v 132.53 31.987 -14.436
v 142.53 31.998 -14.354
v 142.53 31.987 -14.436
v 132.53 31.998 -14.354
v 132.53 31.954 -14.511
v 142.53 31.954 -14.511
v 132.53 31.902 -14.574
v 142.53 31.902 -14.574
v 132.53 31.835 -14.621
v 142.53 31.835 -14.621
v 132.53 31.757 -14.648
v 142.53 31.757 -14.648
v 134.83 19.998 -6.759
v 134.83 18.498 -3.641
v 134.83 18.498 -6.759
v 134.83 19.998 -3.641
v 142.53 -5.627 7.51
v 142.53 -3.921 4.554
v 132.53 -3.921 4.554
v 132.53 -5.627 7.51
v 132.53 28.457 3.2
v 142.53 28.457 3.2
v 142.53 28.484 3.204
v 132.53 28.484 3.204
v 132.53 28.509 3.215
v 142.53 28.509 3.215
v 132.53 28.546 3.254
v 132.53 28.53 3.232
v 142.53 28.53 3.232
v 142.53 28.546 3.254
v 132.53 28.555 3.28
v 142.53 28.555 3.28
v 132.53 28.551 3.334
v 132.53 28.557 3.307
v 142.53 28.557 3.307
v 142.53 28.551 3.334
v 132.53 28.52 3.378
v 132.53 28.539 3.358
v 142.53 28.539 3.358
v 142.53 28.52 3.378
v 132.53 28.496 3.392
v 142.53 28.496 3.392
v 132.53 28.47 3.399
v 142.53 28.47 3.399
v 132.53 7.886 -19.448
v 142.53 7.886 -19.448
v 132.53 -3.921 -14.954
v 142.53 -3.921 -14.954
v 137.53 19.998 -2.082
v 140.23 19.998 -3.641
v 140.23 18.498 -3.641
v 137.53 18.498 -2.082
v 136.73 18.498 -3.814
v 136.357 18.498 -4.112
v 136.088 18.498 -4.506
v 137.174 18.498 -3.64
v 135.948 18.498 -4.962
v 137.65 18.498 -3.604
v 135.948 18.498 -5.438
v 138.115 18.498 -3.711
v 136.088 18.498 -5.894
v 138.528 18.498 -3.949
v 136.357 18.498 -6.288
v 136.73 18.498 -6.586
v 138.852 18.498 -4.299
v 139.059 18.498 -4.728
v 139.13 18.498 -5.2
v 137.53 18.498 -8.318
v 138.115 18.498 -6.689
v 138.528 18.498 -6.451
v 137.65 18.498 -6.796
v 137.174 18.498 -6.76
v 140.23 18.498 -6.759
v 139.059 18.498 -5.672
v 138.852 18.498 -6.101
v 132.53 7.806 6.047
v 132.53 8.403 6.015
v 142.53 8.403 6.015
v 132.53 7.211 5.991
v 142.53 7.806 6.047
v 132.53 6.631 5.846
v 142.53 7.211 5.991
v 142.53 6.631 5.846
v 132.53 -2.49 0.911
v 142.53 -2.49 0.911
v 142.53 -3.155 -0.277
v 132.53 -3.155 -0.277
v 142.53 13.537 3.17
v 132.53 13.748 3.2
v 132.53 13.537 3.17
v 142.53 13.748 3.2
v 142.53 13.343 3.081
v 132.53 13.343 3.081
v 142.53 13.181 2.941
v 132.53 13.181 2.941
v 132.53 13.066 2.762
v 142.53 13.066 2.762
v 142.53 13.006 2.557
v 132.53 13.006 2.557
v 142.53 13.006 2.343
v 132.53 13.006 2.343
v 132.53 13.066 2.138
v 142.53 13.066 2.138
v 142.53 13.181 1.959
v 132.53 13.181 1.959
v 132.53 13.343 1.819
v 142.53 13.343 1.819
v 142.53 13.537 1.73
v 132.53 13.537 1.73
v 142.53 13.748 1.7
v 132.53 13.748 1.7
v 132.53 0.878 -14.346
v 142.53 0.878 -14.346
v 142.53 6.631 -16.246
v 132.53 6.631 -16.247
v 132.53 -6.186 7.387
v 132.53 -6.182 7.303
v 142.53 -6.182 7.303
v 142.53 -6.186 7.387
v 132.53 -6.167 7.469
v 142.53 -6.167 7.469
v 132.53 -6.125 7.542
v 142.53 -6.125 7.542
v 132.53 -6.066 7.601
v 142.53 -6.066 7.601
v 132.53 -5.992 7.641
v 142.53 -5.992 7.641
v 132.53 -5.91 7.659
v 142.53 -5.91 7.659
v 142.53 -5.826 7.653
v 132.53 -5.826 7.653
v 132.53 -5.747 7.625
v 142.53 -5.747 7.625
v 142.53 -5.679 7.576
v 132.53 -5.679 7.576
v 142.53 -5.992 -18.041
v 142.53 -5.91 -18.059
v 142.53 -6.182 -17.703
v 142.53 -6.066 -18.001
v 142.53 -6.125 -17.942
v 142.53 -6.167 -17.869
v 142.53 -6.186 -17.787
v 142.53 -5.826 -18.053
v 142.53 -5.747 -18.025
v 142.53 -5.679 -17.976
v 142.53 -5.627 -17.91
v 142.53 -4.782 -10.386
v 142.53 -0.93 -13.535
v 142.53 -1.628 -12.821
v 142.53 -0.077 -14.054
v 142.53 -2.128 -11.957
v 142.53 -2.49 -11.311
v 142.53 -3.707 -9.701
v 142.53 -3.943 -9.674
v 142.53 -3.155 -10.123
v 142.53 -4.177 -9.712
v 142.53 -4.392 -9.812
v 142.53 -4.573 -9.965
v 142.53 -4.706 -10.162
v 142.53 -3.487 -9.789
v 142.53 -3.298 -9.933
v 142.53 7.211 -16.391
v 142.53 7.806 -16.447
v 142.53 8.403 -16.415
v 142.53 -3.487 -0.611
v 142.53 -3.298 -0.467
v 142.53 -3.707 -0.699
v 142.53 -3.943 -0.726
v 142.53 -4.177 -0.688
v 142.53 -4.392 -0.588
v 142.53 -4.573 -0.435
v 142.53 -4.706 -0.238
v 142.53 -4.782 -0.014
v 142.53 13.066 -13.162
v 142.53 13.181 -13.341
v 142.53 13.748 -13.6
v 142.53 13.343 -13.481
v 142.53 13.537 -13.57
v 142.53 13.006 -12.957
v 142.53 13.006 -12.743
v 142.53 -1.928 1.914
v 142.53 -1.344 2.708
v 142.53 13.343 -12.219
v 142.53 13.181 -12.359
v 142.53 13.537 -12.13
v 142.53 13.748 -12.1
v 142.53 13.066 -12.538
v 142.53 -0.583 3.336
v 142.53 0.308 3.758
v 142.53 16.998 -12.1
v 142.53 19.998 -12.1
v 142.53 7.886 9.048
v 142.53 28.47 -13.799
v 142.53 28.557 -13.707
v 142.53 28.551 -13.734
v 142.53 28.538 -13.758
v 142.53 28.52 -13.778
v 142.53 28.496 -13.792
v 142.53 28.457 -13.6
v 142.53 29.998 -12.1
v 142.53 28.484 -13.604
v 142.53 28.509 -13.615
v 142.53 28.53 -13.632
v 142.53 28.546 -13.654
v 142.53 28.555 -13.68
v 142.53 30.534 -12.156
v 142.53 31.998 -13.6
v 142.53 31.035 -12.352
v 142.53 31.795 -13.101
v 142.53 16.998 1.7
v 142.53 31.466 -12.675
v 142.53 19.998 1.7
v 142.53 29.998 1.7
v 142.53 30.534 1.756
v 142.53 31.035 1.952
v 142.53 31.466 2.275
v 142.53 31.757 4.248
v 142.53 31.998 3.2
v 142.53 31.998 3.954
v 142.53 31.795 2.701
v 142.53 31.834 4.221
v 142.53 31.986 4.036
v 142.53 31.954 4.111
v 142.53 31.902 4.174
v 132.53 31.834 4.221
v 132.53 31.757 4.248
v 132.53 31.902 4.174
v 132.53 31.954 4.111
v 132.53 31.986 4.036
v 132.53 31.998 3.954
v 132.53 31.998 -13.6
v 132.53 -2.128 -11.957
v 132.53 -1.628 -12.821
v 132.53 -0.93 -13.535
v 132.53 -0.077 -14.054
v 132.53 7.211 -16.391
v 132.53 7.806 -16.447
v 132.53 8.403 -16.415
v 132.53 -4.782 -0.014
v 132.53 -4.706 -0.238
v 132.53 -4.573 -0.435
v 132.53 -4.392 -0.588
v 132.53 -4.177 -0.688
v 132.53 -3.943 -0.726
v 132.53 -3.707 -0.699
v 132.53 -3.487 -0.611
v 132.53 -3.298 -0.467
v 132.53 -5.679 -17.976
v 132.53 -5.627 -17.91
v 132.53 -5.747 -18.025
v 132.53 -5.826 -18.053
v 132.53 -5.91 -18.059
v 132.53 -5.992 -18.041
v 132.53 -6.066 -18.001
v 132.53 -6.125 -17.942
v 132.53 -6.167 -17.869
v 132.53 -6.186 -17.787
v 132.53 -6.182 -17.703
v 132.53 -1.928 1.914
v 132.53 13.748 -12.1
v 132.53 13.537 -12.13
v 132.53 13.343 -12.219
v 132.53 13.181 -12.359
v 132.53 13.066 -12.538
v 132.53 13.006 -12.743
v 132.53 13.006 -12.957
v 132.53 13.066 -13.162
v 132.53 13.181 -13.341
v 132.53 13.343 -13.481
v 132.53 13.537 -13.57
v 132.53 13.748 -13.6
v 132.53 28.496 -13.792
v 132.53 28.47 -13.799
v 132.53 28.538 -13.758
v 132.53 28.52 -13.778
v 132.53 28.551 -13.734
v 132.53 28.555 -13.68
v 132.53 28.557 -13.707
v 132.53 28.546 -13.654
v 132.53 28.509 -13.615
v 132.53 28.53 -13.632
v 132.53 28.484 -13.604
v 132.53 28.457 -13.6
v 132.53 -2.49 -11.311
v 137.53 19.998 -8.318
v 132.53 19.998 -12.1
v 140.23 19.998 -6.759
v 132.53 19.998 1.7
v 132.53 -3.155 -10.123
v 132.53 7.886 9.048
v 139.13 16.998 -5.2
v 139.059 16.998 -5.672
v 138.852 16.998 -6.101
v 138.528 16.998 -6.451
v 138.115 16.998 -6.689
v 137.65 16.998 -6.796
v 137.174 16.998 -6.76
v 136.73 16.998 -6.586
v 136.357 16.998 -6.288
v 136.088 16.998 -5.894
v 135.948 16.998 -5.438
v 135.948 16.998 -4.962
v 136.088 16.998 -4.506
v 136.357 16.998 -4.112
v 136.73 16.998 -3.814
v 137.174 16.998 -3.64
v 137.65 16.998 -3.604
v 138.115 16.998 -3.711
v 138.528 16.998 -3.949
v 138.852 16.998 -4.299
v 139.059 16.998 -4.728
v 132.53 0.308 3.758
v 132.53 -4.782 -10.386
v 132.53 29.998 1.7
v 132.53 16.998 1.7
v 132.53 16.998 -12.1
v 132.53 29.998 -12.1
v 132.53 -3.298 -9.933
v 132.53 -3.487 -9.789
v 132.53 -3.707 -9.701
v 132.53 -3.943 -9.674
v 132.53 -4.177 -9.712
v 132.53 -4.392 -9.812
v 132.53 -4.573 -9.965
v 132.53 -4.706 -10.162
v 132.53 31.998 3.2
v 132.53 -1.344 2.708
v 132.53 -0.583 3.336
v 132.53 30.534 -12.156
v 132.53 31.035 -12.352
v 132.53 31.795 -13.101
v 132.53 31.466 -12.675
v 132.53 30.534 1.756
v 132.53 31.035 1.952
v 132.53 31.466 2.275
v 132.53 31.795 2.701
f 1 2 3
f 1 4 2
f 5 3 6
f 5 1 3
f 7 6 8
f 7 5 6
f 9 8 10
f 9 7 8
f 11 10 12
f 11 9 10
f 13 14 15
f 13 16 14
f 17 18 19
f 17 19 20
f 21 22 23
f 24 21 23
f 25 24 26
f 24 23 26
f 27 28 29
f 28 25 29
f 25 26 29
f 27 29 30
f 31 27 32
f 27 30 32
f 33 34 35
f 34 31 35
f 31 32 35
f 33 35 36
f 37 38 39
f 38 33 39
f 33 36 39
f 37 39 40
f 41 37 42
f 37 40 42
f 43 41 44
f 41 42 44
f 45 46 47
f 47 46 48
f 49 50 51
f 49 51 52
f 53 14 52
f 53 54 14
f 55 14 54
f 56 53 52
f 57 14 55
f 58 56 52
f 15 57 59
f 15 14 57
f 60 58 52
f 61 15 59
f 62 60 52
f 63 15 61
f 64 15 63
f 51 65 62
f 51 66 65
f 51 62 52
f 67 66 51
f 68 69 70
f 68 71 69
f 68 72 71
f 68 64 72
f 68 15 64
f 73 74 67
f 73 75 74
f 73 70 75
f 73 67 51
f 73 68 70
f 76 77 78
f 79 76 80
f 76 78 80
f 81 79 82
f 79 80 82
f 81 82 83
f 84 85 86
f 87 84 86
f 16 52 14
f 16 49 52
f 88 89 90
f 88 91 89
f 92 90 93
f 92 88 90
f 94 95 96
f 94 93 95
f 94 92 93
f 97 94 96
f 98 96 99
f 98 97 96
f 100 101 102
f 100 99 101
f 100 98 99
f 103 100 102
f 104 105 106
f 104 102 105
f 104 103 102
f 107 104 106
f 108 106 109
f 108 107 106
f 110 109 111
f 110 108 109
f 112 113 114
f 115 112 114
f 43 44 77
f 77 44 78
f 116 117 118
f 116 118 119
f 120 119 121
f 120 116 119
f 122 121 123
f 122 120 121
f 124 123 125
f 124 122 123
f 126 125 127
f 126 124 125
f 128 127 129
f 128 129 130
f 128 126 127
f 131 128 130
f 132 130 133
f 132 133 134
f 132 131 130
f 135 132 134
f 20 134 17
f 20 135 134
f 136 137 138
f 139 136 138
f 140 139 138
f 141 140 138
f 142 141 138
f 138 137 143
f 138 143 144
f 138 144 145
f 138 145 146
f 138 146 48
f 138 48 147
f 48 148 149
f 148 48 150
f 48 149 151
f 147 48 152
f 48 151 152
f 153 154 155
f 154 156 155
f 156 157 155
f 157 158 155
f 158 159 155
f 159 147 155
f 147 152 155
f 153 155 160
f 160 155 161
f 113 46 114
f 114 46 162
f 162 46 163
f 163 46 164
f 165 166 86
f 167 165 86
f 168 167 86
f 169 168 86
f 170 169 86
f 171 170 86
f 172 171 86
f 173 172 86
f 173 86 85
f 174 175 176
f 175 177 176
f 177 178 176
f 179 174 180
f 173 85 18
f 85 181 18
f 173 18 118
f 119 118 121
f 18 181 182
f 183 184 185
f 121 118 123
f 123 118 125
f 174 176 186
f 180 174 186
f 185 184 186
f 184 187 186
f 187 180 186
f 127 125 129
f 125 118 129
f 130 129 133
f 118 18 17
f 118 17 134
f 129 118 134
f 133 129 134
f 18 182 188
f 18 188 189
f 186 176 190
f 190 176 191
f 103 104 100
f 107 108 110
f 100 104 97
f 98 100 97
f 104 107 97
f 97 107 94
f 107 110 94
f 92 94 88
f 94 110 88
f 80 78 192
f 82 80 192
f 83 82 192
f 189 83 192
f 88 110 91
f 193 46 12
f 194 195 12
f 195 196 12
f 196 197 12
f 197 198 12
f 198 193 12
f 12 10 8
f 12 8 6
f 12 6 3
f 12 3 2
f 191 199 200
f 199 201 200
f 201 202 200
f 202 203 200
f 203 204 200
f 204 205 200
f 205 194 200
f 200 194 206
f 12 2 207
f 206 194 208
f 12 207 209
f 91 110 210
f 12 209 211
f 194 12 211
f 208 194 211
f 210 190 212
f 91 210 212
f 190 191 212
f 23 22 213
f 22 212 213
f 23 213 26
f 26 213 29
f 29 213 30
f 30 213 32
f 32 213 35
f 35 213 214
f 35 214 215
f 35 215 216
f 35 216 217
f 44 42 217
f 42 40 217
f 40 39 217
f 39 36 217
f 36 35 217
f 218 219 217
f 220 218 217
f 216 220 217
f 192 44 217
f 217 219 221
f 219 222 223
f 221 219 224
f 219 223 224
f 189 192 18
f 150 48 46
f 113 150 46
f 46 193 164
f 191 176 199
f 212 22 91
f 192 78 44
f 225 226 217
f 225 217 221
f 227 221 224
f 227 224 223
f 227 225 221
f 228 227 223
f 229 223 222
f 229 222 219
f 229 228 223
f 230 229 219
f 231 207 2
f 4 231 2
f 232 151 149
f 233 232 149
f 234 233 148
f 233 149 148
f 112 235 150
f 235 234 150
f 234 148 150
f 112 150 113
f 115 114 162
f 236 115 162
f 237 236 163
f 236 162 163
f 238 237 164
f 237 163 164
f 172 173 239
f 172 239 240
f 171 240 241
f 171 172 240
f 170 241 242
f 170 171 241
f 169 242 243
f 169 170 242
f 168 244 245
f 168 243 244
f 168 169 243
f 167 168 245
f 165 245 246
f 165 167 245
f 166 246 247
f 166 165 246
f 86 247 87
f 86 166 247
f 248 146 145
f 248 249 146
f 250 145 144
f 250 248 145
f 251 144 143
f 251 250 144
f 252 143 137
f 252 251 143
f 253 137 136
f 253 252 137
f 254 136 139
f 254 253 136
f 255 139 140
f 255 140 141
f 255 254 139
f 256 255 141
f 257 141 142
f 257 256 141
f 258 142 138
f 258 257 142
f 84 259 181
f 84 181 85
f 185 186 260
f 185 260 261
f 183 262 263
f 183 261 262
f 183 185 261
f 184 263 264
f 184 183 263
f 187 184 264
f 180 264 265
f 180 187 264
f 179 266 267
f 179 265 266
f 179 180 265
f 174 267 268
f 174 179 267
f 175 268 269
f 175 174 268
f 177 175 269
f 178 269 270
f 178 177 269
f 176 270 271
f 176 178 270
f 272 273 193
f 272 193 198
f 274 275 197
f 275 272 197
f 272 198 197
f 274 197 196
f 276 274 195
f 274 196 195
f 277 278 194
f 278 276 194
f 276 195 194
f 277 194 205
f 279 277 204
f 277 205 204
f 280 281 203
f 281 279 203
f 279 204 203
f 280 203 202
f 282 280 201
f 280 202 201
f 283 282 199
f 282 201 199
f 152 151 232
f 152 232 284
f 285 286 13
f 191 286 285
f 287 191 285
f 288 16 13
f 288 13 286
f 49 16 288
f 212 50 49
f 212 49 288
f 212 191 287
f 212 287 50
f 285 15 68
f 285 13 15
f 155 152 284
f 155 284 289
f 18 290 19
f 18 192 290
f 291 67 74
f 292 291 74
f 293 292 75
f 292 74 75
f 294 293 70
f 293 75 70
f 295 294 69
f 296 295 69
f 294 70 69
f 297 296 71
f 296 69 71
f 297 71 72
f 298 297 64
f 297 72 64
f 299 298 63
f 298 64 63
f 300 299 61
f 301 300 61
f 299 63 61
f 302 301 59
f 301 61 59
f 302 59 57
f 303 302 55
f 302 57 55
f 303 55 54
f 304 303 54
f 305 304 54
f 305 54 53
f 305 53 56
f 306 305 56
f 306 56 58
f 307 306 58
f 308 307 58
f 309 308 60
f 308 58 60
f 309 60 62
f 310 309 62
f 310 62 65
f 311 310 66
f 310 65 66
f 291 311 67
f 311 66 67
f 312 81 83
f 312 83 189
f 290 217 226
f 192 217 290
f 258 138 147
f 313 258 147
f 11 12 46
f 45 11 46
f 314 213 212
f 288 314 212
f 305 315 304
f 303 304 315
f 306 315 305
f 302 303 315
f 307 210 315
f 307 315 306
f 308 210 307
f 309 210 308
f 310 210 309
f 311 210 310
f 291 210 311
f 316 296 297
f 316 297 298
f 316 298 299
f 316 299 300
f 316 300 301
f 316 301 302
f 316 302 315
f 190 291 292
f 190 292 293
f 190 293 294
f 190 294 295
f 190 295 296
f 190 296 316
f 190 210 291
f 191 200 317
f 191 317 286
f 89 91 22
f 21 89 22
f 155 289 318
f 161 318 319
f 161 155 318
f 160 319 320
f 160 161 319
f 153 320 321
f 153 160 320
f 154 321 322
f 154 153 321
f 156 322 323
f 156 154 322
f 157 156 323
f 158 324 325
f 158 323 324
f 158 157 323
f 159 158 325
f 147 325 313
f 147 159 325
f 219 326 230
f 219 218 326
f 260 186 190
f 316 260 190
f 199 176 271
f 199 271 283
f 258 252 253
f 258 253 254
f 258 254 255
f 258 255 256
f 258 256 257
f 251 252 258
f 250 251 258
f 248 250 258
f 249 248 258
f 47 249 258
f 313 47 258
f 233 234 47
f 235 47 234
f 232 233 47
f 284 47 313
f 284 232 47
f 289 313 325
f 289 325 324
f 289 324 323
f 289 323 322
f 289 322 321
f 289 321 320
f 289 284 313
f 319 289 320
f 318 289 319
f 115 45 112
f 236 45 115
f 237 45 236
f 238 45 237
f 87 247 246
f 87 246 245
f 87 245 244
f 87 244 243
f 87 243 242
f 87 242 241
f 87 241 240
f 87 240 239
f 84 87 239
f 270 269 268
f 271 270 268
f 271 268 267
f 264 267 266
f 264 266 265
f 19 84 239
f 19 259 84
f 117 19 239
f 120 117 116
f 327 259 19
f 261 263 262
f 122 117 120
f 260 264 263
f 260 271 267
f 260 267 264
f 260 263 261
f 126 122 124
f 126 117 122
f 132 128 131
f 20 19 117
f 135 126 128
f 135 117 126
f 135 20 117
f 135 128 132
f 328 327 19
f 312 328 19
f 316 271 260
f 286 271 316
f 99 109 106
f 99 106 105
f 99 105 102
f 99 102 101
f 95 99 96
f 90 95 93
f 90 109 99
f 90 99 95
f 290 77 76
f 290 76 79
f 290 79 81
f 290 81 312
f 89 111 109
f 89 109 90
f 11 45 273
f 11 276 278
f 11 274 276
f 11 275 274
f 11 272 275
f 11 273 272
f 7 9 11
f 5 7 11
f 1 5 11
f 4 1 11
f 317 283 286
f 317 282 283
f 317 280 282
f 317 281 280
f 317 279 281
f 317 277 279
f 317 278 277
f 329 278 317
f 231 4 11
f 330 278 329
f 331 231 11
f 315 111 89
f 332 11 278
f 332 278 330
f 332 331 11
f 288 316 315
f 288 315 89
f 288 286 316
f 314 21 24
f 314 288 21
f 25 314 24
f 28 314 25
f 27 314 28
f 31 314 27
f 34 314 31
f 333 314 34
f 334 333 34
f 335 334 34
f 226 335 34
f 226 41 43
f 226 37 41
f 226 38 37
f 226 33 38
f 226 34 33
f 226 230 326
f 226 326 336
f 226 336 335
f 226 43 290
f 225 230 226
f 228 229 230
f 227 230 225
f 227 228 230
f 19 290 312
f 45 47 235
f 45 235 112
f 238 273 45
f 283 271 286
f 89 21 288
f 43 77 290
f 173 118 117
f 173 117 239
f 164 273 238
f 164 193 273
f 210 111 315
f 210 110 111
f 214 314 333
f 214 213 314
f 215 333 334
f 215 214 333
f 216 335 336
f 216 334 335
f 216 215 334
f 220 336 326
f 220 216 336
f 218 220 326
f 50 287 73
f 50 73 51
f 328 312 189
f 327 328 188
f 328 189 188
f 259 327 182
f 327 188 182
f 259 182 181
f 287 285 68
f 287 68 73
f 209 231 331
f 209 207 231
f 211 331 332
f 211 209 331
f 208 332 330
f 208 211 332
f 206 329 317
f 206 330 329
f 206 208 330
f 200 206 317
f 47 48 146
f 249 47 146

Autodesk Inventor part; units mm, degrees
ref_plane "YZ Plane" through (0, 0, 0) normal (1, 0, 0) x (0, 1, 0)
ref_plane "XZ Plane" through (0, 0, 0) normal (0, 1, 0) x (-1, 0, 0)
ref_plane "XY Plane" through (0, 0, 0) normal (0, 0, 1) x (1, 0, 0)
sketch "Эскиз8" plane through (0, 0, 0) normal (1, 0, 0) x (0, 1, 0)
  line L0 (0, 0) -> (10.4, 0)
  line L1 (10.4, 0) -> (10.4, -10.4)
  line L2 (10.4, -10.4) -> (0, -10.4)
  line L3 (0, -10.4) -> (0, 0)
  line L4 (5.2, 0) -> (5.2, 4)
  line L5 (5.2, -10.4) -> (5.2, -14.4)
  circle A0 centre (5.2, 4) radius 1.6
  circle A1 centre (5.2, -14.4) radius 1.6
  line L6 (5.2, 4) -> (7.9, 4)
  line L7 (7.9, 2.4412) -> (5.2, 0.8823)
  line L8 (5.2, 0.8823) -> (2.5, 2.4412)
  line L9 (2.5, 2.4412) -> (2.5, 5.5588)
  line L10 (2.5, 5.5588) -> (5.2, 7.1177)
  line L11 (5.2, 7.1177) -> (7.9, 5.5588)
  line L12 (7.9, 5.5588) -> (7.9, 2.4412)
  line L13 (7.9, -15.9588) -> (5.2, -17.5177)
  line L14 (5.2, -17.5177) -> (2.5, -15.9588)
  line L15 (2.5, -15.9588) -> (2.5, -12.8412)
  line L16 (2.5, -12.8412) -> (5.2, -11.2823)
  line L17 (5.2, -11.2823) -> (7.9, -12.8412)
  line L18 (7.9, -12.8412) -> (7.9, -15.9588)
  circle A2 centre (5.2, 4) radius 5.2
  circle A3 centre (5.2, -14.4) radius 5.2
  line L19 (10.4, 4) -> (10.4, 0)
  line L20 (10.4, -10.4) -> (10.4, -14.4)
  line L21 (0, -14.4) -> (0, -10.4)
  line L22 (0, 4) -> (0, 0)
  line L23 (7.9, 5.5588) -> (7.9, 8.4441)
  line L24 (2.5, 5.5588) -> (2.5, 8.4441)
  line L25 (2.5, -15.9588) -> (2.5, -18.8441)
  line L26 (7.9, -15.9588) -> (7.9, -18.8441)
  line L27 (0, 0) -> (-3, 0)
  line L28 (-3, 0) -> (-3, -10.4)
  line L29 (-3, -10.4) -> (0, -10.4)
  line L30 (0, -10.4) -> (0, 0)
  line L31 (10.4, 0) -> (8.9, 2.5981)
  line L32 (10.4, -10.4) -> (8.9, -12.9981)
  line L33 (10.4, -10.4) -> (13.4, -10.4) construction
  line L34 (8.9, -12.9981) -> (4.4, -10.4)
  line L35 (8.9, 2.5981) -> (4.4, 0)
  line L36 (-3, 0) -> (0.663, 6.5408)
  line L37 (-3, -10.4) -> (0.663, -16.9408)
  line L38 (10.4, 0) -> (12.9981, 1.5)
  line L39 (12.9981, 1.5) -> (9.5707, 6.8173)
  line L40 (10.4, -10.4) -> (12.9981, -11.9)
  line L41 (12.9981, -11.9) -> (9.5707, -17.2173)
  point P0 (7.9, -14.4)
  dimension "d51" = 10.4
  dimension "d52" = 10.4
  dimension "d53" = 4
  dimension "d54" = 4
  dimension "d55" = 3.2
  dimension "d56" = 3.2
  dimension "d57" = 2.7
  dimension "d58" = 3
  dimension "d59" = 3
  dimension "d60" = 3
  dimension "d61" = 120
  dimension "d62" = 3
  dimension "d63" = 3
extrude "Выдавливание6" add sketch "Эскиз8" along normal blind 5 contours L0 A2 L24 L9 L8 L4 L35 | L0 L22 A2 | L4 L7 L12 L23 A2 L31 L35 | L27 L36 A2 L22 | L3 L29 L28 L27 | L31 A2 L19 | L19 A2 L39 L38 | L2 A3 L21 | L21 A3 L37 L29 | L40 L41 A3 L20 | L20 A3 L32 | L2 L34 L5 L16 L15 L25 A3 | A3 L26 L18 L17 L5 L34 L32
sketch "Эскиз9" plane through (0, 0, 0) normal (-1, 0, 0) x (0, 0, 1)
  arc A0 (-18.8441, 2.5) -> (-16.9408, 0.663) centre (-14.4, 5.2) ccw projected
  circle A1 centre (-14.4, 5.2) radius 5.2
  circle A2 centre (-14.4, 5.2) radius 1.6
  arc A3 (6.5408, 0.663) -> (8.4441, 2.5) centre (4, 5.2) ccw projected
  circle A4 centre (4, 5.2) radius 5.2
  circle A5 centre (4, 5.2) radius 1.6
  line L0 (2.5981, 8.9) -> (0, 10.4) projected
  line L1 (0, 10.4) -> (2.5981, 8.9)
  line L2 (0, 4.4) -> (2.5981, 8.9) projected
  line L3 (2.5981, 8.9) -> (0, 4.4)
  line L4 (0, 0) -> (0, 4.4) projected
  line L5 (0, 4.4) -> (0, 0)
  line L6 (-10.4, 4.4) -> (-10.4, 0) projected
  line L7 (0, 0) -> (-10.4, 0)
  line L8 (-10.4, 0) -> (-10.4, 1.8774)
  line L9 (-10.4, 10.4) -> (-12.9981, 8.9) projected
  line L10 (-11.699, 9.65) -> (-10.4, 10.4)
  line L11 (-11.9, 12.9981) -> (-10.4, 10.4) projected
  line L12 (-10.4, 10.4) -> (-11.9, 12.9981)
  line L13 (-17.2173, 9.5707) -> (-11.9, 12.9981) projected
  line L14 (-11.9, 12.9981) -> (-17.2173, 9.5707)
  line L15 (0, 10.4) -> (1.5, 12.9981) projected
  line L16 (0, 10.4) -> (1.5, 12.9981)
  line L17 (1.5, 12.9981) -> (6.8173, 9.5707) projected
  line L18 (1.5, 12.9981) -> (6.8173, 9.5707)
  line L19 (0, -3) -> (-10.4, -3) projected
  line L20 (0, -3) -> (6.5408, 0.663)
  line L21 (6.5408, 0.663) -> (0, -3) projected
  line L22 (-10.4, -3) -> (-16.9408, 0.663)
  line L23 (-10.4, -3) -> (-16.9408, 0.663) projected
  line L24 (-10.4, -3) -> (0, -3)
  line L25 (-10.4, 0) -> (0, 0) projected
  line L26 (0, 0) -> (-10.4, 0)
  line L27 (-10.4, 0) -> (-10.4, 1.8774)
  line L28 (0, 1.8774) -> (0, 0)
  line L29 (-11.699, 9.65) -> (-12.9981, 8.9)
  line L30 (-12.9981, 8.9) -> (-10.4, 4.4) projected
  line L31 (-10.4, 4.4) -> (-12.9981, 8.9)
  line L32 (-12.9981, 8.9) -> (-10.4, 4.4)
  line L33 (-10.4, 4.4) -> (-10.4, 1.8774)
  line L34 (0, 1.8774) -> (0, 4.4)
  line L35 (2.5981, 8.9) -> (0, 4.4)
  line L36 (1.299, 9.65) -> (2.5981, 8.9)
  point P0 (-18.8441, 2.5)
  point P1 (-16.9408, 0.663)
  point P2 (6.5408, 0.663)
  point P3 (8.4441, 2.5)
  dimension "d66" = 3.2
  dimension "d67" = 3.2
extrude "Выдавливание7" add sketch "Эскиз9" along normal blind 5 contours A1 L9 L30 L6 A0 | A1 L6 L7 L4 A4 L20 L19 L22 | L13 L11 L9 A1 | A4 L4 L2 L0 A3 | L0 L15 L17 A4
sketch "Эскиз10" plane through (5, 0, 0) normal (1, 0, 0) x (0, 0, -1)
  line L0 (-1.5, 12.9981) -> (-6.8173, 9.5707) projected
  line L1 (0, 10.4) -> (-1.5, 12.9981) projected
  line L2 (-1.5, 12.9981) -> (0, 10.4)
  line L3 (-2.5981, 8.9) -> (0, 10.4) projected
  line L4 (0, 10.4) -> (-2.5981, 8.9)
  line L5 (0, 4.4) -> (-2.5981, 8.9) projected
  line L6 (-2.5981, 8.9) -> (0, 4.4)
  line L7 (0, 0) -> (0, 4.4) projected
  line L8 (0, 4.4) -> (0, 0)
  line L9 (10.4, 0) -> (0, 0) projected
  line L10 (0, 0) -> (10.4, 0)
  line L11 (10.4, 4.4) -> (10.4, 0) projected
  line L12 (10.4, 0) -> (10.4, 4.4)
  line L13 (10.4, 10.4) -> (12.9981, 8.9) projected
  line L14 (10.4, 4.4) -> (12.9981, 8.9)
  line L15 (12.9981, 8.9) -> (10.4, 10.4)
  line L16 (11.9, 12.9981) -> (10.4, 10.4) projected
  line L17 (10.4, 10.4) -> (11.9, 12.9981)
  line L18 (17.2173, 9.5707) -> (11.9, 12.9981) projected
  line L19 (11.9, 12.9981) -> (17.2173, 9.5707)
  line L20 (17.2173, 9.5707) -> (13.6704, -1.1685)
  line L21 (10.4, -3) -> (16.9408, 0.663) projected
  line L22 (10.4, -3) -> (13.6704, -1.1685)
  line L23 (0, -3) -> (10.4, -3) projected
  line L24 (-6.5408, 0.663) -> (0, -3) projected
  line L25 (10.4, -3) -> (0, -3)
  arc A0 (-8.4441, 2.5) -> (-6.5408, 0.663) centre (-4, 5.2) ccw projected
  line L26 (0, -3) -> (-6.5408, 0.663)
  line L27 (-3.2704, -1.1685) -> (-6.8173, 9.5707)
  line L28 (-6.8173, 9.5707) -> (-1.5, 12.9981)
extrude "Выдавливание8" add sketch "Эскиз10" along normal blind 157.53
sketch "Эскиз17" plane through (-5, 0, 0) normal (-1, 0, 0) x (0, 0, 1)
  line L0 (-37.7292, 41.1824) -> (41.3103, 41.1824)
  line L1 (41.3103, 41.1824) -> (41.3103, -34.7876)
  line L2 (41.3103, -34.7876) -> (-37.7292, -34.7876)
  line L3 (-37.7292, -34.7876) -> (-37.7292, 41.1824)
  point P0 (0, 0)
extrude "Выдавливание13" cut sketch "Эскиз17" against normal blind 147.53
sketch "Эскиз23" plane through (162.53, 0, 0) normal (1, 0, 0) x (0, 0, -1)
  point P0 (0, 0)
fillet "Сопряжение12" radius 4 6 edges at (152.53, -3, -10.4) (152.53, -1.1685, -13.6704) (152.53, -3, 0) (152.53, -1.1685, 3.2704) (152.53, 9.5707, -17.2173) (152.53, 9.5707, 6.8173)
sketch "Эскиз24" plane through (142.53, 0, 0) normal (-1, 0, 0) x (0, 0, 1)
  line L0 (-11.9, 12.9981) -> (-10.4, 10.4) projected
  line L1 (-11.9, 12.9981) -> (1.5, 12.9981)
  line L2 (1.5, 12.9981) -> (1.5, 16.9981)
  line L3 (1.5, 16.9981) -> (-11.9, 16.9981)
  line L4 (-11.9, 16.9981) -> (-11.9, 12.9981)
  line L5 (1.5, 16.9981) -> (-11.9, 16.9981)
  line L6 (-11.9, 16.9981) -> (-11.9, 19.9981)
  line L7 (-11.9, 19.9981) -> (1.5, 19.9981)
  line L8 (1.5, 19.9981) -> (1.5, 16.9981)
  line L9 (-11.9, 16.9981) -> (-11.7, 16.9981) construction
  line L10 (-14.6154, 11.2478) -> (-11.9, 12.9981) projected
  line L11 (-12.1, 12.9981) -> (-11.9, 12.9981)
  line L12 (1.5, 12.9981) -> (1.7, 12.9981)
  line L13 (1.7, 13.7481) -> (1.7, 19.9981)
  line L14 (1.7, 19.9981) -> (1.5, 19.9981)
  line L15 (-12.1, 13.7481) -> (-12.1, 19.9981)
  line L16 (-12.1, 19.9981) -> (-11.9, 19.9981)
  line L17 (-12.1, 16.9981) -> (-11.9, 16.9981)
  line L18 (1.5, 16.9981) -> (1.7, 16.9981)
  line L19 (-12.85, 12.9981) -> (-12.85, 12.9981)
  line L20 (-13.6, 13.7481) -> (-13.6, 28.4571)
  line L21 (-13.6, 29.9981) -> (-12.1, 29.9981)
  line L22 (-12.1, 29.9981) -> (-12.1, 12.9981)
  line L23 (2.45, 12.9981) -> (2.45, 12.9981)
  line L24 (3.2, 13.7481) -> (3.2, 28.4571)
  line L25 (3.2, 29.9981) -> (1.7, 29.9981)
  line L26 (1.7, 29.9981) -> (1.7, 12.9981)
  line L27 (-13.7992, 28.47) -> (-16.4147, 8.4027)
  arc A0 (-14.6154, 11.2478) -> (-16.2465, 6.6313) centre (-12.4482, 7.8857) ccw projected
  line L28 (3.3992, 28.47) -> (6.0147, 8.4027)
  arc A1 (5.8465, 6.6313) -> (4.2154, 11.2478) centre (2.0482, 7.8857) ccw projected
  arc A2 (-12.85, 12.9981) -> (-12.1, 13.7481) centre (-12.85, 13.7481) ccw
  arc A3 (-13.6, 13.7481) -> (-12.85, 12.9981) centre (-12.85, 13.7481) ccw
  arc A4 (1.7, 13.7481) -> (2.45, 12.9981) centre (2.45, 13.7481) ccw
  arc A5 (2.45, 12.9981) -> (3.2, 13.7481) centre (2.45, 13.7481) ccw
  line L29 (-14.1579, 0.3075) -> (-16.2465, 6.6313) projected
  line L30 (-16.2465, 6.6313) -> (-14.1579, 0.3075)
  circle A6 centre (-12.4482, 7.8857) radius 4
  line L31 (5.8465, 6.6313) -> (3.7579, 0.3075) projected
  circle A7 centre (2.0482, 7.8857) radius 4
  arc A8 (1.9142, -1.928) -> (3.7579, 0.3075) centre (-0.0403, 1.562) ccw projected
  circle A9 centre (-0.0403, 1.562) radius 4
  arc A10 (-1.0438, -3) -> (0.9107, -2.49) centre (-1.0438, 1) ccw projected
  circle A11 centre (-1.0438, 1) radius 4
  line L32 (-10.4, 4.4) -> (-10.4, 0) projected
  circle A12 centre (-10.4, 1.562) radius 4.0051
  arc A13 (-11.3107, -2.49) -> (-9.3562, -3) centre (-9.3562, 1) ccw projected
  circle A14 centre (-9.3562, 1) radius 4
  arc A15 (-14.1579, 0.3075) -> (-12.3142, -1.928) centre (-10.3597, 1.562) ccw projected
  line L33 (-12.3142, -1.928) -> (-11.3107, -2.49)
  line L34 (1.9142, -1.928) -> (0.9107, -2.49) projected
  line L35 (1.9142, -1.928) -> (0.9107, -2.49)
  line L36 (-1.0438, -3) -> (-9.3562, -3) projected
  line L37 (-9.3562, -3) -> (-1.0438, -3)
  line L38 (0.9107, -2.49) -> (-0.2774, -3.1554)
  line L39 (-11.3107, -2.49) -> (-10.1226, -3.1554)
  line L40 (2.0482, 7.8857) -> (6.0482, 7.8857)
  line L41 (6.0482, 7.8857) -> (9.0482, 7.8857)
  line L42 (-16.4482, 7.8857) -> (-19.4482, 7.8857)
  line L43 (-19.4482, 7.8857) -> (-14.9537, -3.9206)
  line L44 (-13.6, 29.9981) -> (-13.6, 31.9981)
  line L45 (3.2, 29.9981) -> (3.2, 31.9981)
  arc A16 (3.2, 31.9981) -> (1.7, 29.9981) centre (3.699, 30.0613) ccw
  arc A17 (-12.1, 29.9981) -> (-13.6, 31.9981) centre (-14.099, 30.0613) ccw
  arc A18 (3.3992, 28.47) -> (3.2, 28.4571) centre (3.3, 28.4571) ccw
  arc A19 (-13.6, 28.4571) -> (-13.7992, 28.47) centre (-13.7, 28.4571) ccw
  line L46 (3.2, 31.9981) -> (4.2, 31.9976)
  line L47 (4.2, 31.9976) -> (9.0482, 7.8857)
  line L48 (-13.6, 31.9981) -> (-14.6, 31.9981)
  line L49 (-14.6, 31.9981) -> (-19.4482, 7.8857)
  line L50 (9.0482, 7.8857) -> (4.5537, -3.9206)
  circle A20 centre (0.1512, -3.9206) radius 0.8771
  circle A21 centre (-10.5512, -3.9206) radius 0.8771
  line L51 (4.5537, -3.9206) -> (9.0482, -6.5155)
  line L52 (4.5537, -3.9206) -> (9.7436, -3.9206) construction
  line L53 (9.0482, -6.5155) -> (-0.0136, -4.7821)
  line L54 (-14.9537, -3.9206) -> (-19.4482, -6.5155)
  line L55 (-14.9537, -3.9206) -> (-9.7638, -3.9206) construction
  line L56 (-19.4482, -6.5155) -> (-10.3864, -4.7821)
  point P0 (0, 0)
  point P1 (-13.6, 12.9981)
  point P2 (3.2, 12.9981)
  point P3 (-15.1183, -5.3024)
  point P4 (-11.3107, -2.49)
  point P5 (-11.9564, -2.1284)
  point P6 (-14.3463, 0.8779)
  dimension "d145" = 4
  dimension "d149" = 0.2
  dimension "d150" = 1.5
  dimension "d151" = 17
  dimension "d152" = 1.5
  dimension "d153" = 17
  dimension "d154" = 0.75
  dimension "d161" = 3
  dimension "d162" = 3
  dimension "d163" = 2
  dimension "d164" = 2
  dimension "d165" = 2
  dimension "d166" = 0.1
  dimension "d167" = 1
  dimension "d168" = 1
  dimension "d187" = 30
  dimension "d188" = 150
extrude "Выдавливание17" add sketch "Эскиз24" along normal blind 10 contours L6 L7 L8 L3 | L17 L15 L16 L6 | L8 L14 L13 L18 | L15 A2 A3 L20 A19 L27 A0 L42 L49 L48 L44 L21 L22 | L13 L26 L25 L45 L46 L47 L41 A1 L28 A18 L24 A5 A4 | A0 L29 A12 L33 L39 A21 L56 L54 L43 L42 | L21 L44 A17 | A16 L45 L25 | A21 | L34 A8 L31 A1 L41 L50 L51 L53 A20 L38 | A20
fillet "Сопряжение13" radius 0.3 4 edges at (137.53, 31.9976, 4.2) (137.53, 31.9981, -14.6) (137.53, -6.5155, 9.0482) (137.53, -6.5155, -19.4482)
sketch "Эскиз25" plane through (162.53, 0, 0) normal (1, 0, 0) x (0, 0, -1)
  line L0 (-19.4307, 22.3831) -> (30.691, 22.3831)
  line L1 (30.691, 22.3831) -> (30.691, -15.6545)
  line L2 (30.691, -15.6545) -> (-19.4307, -15.6545)
  line L3 (-19.4307, -15.6545) -> (-19.4307, 22.3831)
  point P0 (0, 0)
extrude "Выдавливание18" cut sketch "Эскиз25" against normal blind 20
sketch "Эскиз28" plane through (132.53, 19.9981, -12.1) normal (0, 1, 0) x (1, 0, 0)
  line L0 (0, -13.8) -> (0, 0) projected
  line L1 (0, -6.9) -> (10, -6.9)
  line L2 (10, -13.8) -> (10, 0) projected
  circle A0 centre (5, -6.9) radius 1.6
  point P0 (-132.53, -12.1)
  dimension "d189" = 3.2
extrude "Выдавливание21" cut sketch "Эскиз28" against normal blind 10
sketch "Эскиз29" plane through (132.53, 19.9981, -12.1) normal (0, 1, 0) x (1, 0, 0)
  circle A0 centre (5, -6.9) radius 1.6 projected
  line L0 (5, -6.9) -> (7.7, -6.9)
  line L1 (7.7, -8.4588) -> (5, -10.0177)
  line L2 (5, -10.0177) -> (2.3, -8.4588)
  line L3 (2.3, -8.4588) -> (2.3, -5.3412)
  line L4 (2.3, -5.3412) -> (5, -3.7823)
  line L5 (5, -3.7823) -> (7.7, -5.3412)
  line L6 (7.7, -5.3412) -> (7.7, -8.4588)
  point P0 (-132.53, -12.1)
  dimension "d192" = 2.7
extrude "Выдавливание22" cut sketch "Эскиз29" against normal blind 1.5
properties part number "защёлка_выдача2"
